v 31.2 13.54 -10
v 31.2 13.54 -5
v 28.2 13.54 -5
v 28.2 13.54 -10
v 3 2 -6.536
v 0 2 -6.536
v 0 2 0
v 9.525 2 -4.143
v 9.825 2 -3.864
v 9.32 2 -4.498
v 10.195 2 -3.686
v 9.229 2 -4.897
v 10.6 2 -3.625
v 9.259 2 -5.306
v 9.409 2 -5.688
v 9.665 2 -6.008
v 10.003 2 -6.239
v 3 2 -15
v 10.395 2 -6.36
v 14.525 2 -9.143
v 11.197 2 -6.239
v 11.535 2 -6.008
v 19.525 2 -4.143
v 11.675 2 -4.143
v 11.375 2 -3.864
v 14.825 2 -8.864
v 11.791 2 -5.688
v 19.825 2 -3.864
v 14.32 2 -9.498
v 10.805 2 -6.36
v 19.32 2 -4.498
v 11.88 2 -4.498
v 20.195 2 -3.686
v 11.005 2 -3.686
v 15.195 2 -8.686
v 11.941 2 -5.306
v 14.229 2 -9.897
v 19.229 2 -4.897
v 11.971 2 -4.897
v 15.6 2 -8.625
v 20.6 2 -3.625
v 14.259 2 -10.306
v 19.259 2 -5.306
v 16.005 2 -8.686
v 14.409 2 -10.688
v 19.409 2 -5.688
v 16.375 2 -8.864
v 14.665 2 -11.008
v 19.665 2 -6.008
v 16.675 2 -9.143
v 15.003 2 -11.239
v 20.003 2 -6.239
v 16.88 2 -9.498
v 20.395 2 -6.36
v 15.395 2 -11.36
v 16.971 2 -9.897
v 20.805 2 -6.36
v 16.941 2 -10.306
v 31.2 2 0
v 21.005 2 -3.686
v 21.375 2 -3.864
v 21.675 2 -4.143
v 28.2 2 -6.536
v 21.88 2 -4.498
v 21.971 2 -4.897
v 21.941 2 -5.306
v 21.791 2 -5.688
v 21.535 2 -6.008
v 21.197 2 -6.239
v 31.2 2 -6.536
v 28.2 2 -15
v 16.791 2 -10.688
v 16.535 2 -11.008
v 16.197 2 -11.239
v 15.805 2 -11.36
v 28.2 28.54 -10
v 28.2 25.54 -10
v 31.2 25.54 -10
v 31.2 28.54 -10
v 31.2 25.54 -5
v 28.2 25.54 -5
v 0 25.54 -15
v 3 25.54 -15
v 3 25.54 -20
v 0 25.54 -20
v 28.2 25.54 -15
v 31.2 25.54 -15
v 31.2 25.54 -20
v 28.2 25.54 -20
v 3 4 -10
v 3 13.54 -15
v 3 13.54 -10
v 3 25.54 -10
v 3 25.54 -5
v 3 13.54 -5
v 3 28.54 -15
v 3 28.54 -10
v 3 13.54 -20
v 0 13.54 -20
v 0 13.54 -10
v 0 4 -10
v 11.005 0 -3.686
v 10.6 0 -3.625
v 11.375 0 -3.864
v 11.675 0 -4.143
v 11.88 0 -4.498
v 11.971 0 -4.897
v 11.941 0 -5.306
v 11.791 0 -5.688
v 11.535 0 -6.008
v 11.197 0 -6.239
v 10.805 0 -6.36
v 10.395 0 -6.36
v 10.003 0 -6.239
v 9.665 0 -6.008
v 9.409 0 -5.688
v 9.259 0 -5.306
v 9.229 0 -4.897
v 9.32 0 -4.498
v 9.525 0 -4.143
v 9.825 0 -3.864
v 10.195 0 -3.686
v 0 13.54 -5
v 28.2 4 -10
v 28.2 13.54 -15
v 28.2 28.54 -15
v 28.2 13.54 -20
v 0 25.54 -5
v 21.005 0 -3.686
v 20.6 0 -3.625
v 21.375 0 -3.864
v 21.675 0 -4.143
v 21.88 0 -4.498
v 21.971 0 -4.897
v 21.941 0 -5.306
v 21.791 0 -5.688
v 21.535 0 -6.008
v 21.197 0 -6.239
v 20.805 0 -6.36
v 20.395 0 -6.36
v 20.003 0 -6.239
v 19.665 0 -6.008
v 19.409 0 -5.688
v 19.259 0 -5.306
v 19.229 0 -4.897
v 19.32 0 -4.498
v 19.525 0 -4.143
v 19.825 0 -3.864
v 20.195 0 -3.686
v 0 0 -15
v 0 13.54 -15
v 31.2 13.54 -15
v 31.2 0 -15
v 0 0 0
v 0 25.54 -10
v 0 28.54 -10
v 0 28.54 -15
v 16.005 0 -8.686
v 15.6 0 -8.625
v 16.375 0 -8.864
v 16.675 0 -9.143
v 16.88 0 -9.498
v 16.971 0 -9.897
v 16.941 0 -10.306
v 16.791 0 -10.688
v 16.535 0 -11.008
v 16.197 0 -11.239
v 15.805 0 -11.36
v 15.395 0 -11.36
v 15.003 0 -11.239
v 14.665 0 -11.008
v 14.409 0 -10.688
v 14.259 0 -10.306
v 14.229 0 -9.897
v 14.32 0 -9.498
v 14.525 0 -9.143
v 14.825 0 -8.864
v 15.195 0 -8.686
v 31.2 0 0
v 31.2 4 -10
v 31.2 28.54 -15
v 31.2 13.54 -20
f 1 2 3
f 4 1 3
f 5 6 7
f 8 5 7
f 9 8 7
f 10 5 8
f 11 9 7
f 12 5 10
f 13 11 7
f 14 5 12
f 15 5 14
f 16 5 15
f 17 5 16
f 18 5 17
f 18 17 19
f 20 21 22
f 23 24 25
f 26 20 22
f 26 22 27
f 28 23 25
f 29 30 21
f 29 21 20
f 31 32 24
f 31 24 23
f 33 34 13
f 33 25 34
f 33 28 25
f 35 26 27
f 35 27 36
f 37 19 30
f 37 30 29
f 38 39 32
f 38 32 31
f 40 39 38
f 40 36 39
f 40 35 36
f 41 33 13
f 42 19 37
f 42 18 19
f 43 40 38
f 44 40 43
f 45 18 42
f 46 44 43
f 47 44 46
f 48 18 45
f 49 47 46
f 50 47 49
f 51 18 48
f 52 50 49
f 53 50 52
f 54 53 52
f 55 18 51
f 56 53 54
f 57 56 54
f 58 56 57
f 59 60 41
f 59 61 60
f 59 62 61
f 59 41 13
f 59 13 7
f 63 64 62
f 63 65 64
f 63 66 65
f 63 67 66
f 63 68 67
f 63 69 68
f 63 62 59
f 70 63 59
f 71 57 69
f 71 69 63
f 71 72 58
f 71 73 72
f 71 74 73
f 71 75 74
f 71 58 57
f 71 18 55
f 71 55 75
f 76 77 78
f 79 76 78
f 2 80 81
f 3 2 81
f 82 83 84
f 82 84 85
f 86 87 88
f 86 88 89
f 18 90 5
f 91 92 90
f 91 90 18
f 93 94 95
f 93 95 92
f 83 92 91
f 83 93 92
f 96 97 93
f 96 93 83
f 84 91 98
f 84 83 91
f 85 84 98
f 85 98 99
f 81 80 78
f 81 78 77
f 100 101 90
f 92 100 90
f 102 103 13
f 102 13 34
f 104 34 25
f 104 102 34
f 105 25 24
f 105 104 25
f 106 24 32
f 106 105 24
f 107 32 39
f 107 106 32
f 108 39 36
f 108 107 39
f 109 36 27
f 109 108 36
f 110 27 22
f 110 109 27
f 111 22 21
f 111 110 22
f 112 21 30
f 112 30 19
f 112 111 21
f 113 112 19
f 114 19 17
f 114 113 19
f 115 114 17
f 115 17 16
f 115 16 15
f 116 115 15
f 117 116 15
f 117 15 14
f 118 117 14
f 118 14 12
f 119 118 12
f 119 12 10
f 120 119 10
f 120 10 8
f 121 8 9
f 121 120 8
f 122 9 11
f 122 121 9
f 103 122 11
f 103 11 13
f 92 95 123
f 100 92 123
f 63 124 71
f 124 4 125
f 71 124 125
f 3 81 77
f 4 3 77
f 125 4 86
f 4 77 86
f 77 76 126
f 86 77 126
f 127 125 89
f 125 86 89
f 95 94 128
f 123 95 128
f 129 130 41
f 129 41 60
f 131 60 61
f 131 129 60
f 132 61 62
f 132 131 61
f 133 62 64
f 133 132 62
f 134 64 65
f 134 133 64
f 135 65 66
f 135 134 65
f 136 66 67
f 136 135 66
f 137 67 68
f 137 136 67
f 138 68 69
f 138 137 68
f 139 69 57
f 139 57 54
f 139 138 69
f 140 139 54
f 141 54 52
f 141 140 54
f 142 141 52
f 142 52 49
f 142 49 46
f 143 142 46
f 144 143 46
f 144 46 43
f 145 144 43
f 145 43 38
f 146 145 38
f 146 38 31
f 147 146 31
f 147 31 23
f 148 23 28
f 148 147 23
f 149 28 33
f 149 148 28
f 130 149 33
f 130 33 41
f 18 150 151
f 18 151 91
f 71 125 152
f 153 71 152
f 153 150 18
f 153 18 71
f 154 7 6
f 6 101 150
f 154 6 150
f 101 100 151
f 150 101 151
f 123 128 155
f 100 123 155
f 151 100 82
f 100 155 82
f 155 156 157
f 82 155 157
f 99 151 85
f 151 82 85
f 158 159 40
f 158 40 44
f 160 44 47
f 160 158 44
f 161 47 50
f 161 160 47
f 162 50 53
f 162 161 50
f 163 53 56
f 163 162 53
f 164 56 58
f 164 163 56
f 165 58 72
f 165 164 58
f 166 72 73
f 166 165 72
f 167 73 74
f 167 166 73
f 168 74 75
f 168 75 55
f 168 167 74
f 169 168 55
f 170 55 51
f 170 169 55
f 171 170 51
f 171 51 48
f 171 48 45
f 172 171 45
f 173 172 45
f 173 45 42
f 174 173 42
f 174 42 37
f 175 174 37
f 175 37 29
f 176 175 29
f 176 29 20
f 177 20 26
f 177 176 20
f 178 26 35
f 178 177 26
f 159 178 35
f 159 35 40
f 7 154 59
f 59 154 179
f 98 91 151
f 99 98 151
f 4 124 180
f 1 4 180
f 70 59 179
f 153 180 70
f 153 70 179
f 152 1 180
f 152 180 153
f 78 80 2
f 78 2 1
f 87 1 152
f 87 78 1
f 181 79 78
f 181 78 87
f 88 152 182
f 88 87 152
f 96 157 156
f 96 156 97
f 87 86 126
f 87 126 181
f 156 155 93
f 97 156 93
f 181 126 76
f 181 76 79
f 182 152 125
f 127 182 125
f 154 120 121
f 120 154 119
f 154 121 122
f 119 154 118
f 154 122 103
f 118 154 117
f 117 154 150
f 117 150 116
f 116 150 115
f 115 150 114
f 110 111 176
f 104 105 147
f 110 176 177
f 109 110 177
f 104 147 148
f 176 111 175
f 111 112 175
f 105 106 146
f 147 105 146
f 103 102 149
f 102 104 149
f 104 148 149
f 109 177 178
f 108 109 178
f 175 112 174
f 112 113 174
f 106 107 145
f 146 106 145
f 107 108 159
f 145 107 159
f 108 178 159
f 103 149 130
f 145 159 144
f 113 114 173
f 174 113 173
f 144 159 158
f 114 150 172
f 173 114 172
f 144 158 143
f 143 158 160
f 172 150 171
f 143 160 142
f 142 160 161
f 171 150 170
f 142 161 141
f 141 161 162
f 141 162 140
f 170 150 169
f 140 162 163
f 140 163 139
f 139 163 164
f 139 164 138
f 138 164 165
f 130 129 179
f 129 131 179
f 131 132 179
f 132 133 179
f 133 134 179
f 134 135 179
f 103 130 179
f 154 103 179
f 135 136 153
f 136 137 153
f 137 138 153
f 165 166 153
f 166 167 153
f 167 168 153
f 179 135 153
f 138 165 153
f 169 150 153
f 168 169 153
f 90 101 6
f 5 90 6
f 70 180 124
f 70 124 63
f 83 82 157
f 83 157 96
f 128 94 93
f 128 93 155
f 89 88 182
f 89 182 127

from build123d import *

# Parameters (mm, degrees)
SKETCH1_W                = 31.2
SKETCH1_H                = 15
SKETCH1_R                = 1.375
BOSS_EXTRUDE1_DEPTH      = 2
SKETCH2_W                = 3
SKETCH2_H                = 5
BOSS_EXTRUDE2_DEPTH      = 26.54
BOSS_EXTRUDE3_DEPTH      = 5
BOSS_EXTRUDE3_DEPTH_BACK = 10
SKETCH3_W                = 3
SKETCH3_H                = 12
BOSS_EXTRUDE4_DEPTH      = 3
BOSS_EXTRUDE5_DEPTH      = 3


with BuildPart() as part:
    # Sketch1 → Boss-Extrude1 (new body)
    with BuildSketch(Plane(origin=(0, 0, 0), x_dir=(1, 0, 0), z_dir=(0, 1, 0))):
        with Locations((15.6, 7.5)):
            Rectangle(SKETCH1_W, SKETCH1_H)
        with Locations(Location((15.6, 10, 0), (0, 0, 270))):
            Circle(SKETCH1_R, mode=Mode.SUBTRACT)
        with Locations(Location((10.6, 5, 0), (0, 0, 270))):
            Circle(SKETCH1_R, mode=Mode.SUBTRACT)
        with Locations(Location((20.6, 5, 0), (0, 0, 270))):
            Circle(SKETCH1_R, mode=Mode.SUBTRACT)
    extrude(amount=BOSS_EXTRUDE1_DEPTH)

    # Sketch2 → Boss-Extrude2 (add)
    with BuildSketch(Plane(origin=(0, 2, 0), x_dir=(1, 0, 0), z_dir=(0, 1, 0))):
        with Locations((1.5, 12.5)):
            Rectangle(SKETCH2_W, SKETCH2_H)
        with Locations((29.7, 12.5)):
            Rectangle(SKETCH2_W, SKETCH2_H)
    extrude(amount=BOSS_EXTRUDE2_DEPTH)

    # Sketch3 → Boss-Extrude3 (add, two sides: drawn at the far end of the back side and taken through both)
    with BuildSketch(Plane(origin=(0, 0, -15), x_dir=(-1, 0, 0), z_dir=(0, 0, -1)).offset(-BOSS_EXTRUDE3_DEPTH_BACK)):
        with Locations((-29.7, 19.54)):
            Rectangle(SKETCH3_W, SKETCH3_H)
        with Locations((-1.5, 19.54)):
            Rectangle(SKETCH3_W, SKETCH3_H)
    extrude(amount=BOSS_EXTRUDE3_DEPTH + BOSS_EXTRUDE3_DEPTH_BACK)

    # Sketch5 → Boss-Extrude4 (add)
    with BuildSketch(Plane(origin=(31.2, 0, 0), x_dir=(0, 0, -1), z_dir=(1, 0, 0))):
        Polygon((10, 4), (6.535898385, 2), (10, 2), align=None)
    extrude(amount=-BOSS_EXTRUDE4_DEPTH)

    # Sketch6 → Boss-Extrude5 (add)
    with BuildSketch(Plane(origin=(0, 0, 0), x_dir=(0, 0, -1), z_dir=(1, 0, 0))):
        Polygon((10, 4), (6.535898385, 2), (10, 2), align=None)
    extrude(amount=BOSS_EXTRUDE5_DEPTH)


solid = part.part
